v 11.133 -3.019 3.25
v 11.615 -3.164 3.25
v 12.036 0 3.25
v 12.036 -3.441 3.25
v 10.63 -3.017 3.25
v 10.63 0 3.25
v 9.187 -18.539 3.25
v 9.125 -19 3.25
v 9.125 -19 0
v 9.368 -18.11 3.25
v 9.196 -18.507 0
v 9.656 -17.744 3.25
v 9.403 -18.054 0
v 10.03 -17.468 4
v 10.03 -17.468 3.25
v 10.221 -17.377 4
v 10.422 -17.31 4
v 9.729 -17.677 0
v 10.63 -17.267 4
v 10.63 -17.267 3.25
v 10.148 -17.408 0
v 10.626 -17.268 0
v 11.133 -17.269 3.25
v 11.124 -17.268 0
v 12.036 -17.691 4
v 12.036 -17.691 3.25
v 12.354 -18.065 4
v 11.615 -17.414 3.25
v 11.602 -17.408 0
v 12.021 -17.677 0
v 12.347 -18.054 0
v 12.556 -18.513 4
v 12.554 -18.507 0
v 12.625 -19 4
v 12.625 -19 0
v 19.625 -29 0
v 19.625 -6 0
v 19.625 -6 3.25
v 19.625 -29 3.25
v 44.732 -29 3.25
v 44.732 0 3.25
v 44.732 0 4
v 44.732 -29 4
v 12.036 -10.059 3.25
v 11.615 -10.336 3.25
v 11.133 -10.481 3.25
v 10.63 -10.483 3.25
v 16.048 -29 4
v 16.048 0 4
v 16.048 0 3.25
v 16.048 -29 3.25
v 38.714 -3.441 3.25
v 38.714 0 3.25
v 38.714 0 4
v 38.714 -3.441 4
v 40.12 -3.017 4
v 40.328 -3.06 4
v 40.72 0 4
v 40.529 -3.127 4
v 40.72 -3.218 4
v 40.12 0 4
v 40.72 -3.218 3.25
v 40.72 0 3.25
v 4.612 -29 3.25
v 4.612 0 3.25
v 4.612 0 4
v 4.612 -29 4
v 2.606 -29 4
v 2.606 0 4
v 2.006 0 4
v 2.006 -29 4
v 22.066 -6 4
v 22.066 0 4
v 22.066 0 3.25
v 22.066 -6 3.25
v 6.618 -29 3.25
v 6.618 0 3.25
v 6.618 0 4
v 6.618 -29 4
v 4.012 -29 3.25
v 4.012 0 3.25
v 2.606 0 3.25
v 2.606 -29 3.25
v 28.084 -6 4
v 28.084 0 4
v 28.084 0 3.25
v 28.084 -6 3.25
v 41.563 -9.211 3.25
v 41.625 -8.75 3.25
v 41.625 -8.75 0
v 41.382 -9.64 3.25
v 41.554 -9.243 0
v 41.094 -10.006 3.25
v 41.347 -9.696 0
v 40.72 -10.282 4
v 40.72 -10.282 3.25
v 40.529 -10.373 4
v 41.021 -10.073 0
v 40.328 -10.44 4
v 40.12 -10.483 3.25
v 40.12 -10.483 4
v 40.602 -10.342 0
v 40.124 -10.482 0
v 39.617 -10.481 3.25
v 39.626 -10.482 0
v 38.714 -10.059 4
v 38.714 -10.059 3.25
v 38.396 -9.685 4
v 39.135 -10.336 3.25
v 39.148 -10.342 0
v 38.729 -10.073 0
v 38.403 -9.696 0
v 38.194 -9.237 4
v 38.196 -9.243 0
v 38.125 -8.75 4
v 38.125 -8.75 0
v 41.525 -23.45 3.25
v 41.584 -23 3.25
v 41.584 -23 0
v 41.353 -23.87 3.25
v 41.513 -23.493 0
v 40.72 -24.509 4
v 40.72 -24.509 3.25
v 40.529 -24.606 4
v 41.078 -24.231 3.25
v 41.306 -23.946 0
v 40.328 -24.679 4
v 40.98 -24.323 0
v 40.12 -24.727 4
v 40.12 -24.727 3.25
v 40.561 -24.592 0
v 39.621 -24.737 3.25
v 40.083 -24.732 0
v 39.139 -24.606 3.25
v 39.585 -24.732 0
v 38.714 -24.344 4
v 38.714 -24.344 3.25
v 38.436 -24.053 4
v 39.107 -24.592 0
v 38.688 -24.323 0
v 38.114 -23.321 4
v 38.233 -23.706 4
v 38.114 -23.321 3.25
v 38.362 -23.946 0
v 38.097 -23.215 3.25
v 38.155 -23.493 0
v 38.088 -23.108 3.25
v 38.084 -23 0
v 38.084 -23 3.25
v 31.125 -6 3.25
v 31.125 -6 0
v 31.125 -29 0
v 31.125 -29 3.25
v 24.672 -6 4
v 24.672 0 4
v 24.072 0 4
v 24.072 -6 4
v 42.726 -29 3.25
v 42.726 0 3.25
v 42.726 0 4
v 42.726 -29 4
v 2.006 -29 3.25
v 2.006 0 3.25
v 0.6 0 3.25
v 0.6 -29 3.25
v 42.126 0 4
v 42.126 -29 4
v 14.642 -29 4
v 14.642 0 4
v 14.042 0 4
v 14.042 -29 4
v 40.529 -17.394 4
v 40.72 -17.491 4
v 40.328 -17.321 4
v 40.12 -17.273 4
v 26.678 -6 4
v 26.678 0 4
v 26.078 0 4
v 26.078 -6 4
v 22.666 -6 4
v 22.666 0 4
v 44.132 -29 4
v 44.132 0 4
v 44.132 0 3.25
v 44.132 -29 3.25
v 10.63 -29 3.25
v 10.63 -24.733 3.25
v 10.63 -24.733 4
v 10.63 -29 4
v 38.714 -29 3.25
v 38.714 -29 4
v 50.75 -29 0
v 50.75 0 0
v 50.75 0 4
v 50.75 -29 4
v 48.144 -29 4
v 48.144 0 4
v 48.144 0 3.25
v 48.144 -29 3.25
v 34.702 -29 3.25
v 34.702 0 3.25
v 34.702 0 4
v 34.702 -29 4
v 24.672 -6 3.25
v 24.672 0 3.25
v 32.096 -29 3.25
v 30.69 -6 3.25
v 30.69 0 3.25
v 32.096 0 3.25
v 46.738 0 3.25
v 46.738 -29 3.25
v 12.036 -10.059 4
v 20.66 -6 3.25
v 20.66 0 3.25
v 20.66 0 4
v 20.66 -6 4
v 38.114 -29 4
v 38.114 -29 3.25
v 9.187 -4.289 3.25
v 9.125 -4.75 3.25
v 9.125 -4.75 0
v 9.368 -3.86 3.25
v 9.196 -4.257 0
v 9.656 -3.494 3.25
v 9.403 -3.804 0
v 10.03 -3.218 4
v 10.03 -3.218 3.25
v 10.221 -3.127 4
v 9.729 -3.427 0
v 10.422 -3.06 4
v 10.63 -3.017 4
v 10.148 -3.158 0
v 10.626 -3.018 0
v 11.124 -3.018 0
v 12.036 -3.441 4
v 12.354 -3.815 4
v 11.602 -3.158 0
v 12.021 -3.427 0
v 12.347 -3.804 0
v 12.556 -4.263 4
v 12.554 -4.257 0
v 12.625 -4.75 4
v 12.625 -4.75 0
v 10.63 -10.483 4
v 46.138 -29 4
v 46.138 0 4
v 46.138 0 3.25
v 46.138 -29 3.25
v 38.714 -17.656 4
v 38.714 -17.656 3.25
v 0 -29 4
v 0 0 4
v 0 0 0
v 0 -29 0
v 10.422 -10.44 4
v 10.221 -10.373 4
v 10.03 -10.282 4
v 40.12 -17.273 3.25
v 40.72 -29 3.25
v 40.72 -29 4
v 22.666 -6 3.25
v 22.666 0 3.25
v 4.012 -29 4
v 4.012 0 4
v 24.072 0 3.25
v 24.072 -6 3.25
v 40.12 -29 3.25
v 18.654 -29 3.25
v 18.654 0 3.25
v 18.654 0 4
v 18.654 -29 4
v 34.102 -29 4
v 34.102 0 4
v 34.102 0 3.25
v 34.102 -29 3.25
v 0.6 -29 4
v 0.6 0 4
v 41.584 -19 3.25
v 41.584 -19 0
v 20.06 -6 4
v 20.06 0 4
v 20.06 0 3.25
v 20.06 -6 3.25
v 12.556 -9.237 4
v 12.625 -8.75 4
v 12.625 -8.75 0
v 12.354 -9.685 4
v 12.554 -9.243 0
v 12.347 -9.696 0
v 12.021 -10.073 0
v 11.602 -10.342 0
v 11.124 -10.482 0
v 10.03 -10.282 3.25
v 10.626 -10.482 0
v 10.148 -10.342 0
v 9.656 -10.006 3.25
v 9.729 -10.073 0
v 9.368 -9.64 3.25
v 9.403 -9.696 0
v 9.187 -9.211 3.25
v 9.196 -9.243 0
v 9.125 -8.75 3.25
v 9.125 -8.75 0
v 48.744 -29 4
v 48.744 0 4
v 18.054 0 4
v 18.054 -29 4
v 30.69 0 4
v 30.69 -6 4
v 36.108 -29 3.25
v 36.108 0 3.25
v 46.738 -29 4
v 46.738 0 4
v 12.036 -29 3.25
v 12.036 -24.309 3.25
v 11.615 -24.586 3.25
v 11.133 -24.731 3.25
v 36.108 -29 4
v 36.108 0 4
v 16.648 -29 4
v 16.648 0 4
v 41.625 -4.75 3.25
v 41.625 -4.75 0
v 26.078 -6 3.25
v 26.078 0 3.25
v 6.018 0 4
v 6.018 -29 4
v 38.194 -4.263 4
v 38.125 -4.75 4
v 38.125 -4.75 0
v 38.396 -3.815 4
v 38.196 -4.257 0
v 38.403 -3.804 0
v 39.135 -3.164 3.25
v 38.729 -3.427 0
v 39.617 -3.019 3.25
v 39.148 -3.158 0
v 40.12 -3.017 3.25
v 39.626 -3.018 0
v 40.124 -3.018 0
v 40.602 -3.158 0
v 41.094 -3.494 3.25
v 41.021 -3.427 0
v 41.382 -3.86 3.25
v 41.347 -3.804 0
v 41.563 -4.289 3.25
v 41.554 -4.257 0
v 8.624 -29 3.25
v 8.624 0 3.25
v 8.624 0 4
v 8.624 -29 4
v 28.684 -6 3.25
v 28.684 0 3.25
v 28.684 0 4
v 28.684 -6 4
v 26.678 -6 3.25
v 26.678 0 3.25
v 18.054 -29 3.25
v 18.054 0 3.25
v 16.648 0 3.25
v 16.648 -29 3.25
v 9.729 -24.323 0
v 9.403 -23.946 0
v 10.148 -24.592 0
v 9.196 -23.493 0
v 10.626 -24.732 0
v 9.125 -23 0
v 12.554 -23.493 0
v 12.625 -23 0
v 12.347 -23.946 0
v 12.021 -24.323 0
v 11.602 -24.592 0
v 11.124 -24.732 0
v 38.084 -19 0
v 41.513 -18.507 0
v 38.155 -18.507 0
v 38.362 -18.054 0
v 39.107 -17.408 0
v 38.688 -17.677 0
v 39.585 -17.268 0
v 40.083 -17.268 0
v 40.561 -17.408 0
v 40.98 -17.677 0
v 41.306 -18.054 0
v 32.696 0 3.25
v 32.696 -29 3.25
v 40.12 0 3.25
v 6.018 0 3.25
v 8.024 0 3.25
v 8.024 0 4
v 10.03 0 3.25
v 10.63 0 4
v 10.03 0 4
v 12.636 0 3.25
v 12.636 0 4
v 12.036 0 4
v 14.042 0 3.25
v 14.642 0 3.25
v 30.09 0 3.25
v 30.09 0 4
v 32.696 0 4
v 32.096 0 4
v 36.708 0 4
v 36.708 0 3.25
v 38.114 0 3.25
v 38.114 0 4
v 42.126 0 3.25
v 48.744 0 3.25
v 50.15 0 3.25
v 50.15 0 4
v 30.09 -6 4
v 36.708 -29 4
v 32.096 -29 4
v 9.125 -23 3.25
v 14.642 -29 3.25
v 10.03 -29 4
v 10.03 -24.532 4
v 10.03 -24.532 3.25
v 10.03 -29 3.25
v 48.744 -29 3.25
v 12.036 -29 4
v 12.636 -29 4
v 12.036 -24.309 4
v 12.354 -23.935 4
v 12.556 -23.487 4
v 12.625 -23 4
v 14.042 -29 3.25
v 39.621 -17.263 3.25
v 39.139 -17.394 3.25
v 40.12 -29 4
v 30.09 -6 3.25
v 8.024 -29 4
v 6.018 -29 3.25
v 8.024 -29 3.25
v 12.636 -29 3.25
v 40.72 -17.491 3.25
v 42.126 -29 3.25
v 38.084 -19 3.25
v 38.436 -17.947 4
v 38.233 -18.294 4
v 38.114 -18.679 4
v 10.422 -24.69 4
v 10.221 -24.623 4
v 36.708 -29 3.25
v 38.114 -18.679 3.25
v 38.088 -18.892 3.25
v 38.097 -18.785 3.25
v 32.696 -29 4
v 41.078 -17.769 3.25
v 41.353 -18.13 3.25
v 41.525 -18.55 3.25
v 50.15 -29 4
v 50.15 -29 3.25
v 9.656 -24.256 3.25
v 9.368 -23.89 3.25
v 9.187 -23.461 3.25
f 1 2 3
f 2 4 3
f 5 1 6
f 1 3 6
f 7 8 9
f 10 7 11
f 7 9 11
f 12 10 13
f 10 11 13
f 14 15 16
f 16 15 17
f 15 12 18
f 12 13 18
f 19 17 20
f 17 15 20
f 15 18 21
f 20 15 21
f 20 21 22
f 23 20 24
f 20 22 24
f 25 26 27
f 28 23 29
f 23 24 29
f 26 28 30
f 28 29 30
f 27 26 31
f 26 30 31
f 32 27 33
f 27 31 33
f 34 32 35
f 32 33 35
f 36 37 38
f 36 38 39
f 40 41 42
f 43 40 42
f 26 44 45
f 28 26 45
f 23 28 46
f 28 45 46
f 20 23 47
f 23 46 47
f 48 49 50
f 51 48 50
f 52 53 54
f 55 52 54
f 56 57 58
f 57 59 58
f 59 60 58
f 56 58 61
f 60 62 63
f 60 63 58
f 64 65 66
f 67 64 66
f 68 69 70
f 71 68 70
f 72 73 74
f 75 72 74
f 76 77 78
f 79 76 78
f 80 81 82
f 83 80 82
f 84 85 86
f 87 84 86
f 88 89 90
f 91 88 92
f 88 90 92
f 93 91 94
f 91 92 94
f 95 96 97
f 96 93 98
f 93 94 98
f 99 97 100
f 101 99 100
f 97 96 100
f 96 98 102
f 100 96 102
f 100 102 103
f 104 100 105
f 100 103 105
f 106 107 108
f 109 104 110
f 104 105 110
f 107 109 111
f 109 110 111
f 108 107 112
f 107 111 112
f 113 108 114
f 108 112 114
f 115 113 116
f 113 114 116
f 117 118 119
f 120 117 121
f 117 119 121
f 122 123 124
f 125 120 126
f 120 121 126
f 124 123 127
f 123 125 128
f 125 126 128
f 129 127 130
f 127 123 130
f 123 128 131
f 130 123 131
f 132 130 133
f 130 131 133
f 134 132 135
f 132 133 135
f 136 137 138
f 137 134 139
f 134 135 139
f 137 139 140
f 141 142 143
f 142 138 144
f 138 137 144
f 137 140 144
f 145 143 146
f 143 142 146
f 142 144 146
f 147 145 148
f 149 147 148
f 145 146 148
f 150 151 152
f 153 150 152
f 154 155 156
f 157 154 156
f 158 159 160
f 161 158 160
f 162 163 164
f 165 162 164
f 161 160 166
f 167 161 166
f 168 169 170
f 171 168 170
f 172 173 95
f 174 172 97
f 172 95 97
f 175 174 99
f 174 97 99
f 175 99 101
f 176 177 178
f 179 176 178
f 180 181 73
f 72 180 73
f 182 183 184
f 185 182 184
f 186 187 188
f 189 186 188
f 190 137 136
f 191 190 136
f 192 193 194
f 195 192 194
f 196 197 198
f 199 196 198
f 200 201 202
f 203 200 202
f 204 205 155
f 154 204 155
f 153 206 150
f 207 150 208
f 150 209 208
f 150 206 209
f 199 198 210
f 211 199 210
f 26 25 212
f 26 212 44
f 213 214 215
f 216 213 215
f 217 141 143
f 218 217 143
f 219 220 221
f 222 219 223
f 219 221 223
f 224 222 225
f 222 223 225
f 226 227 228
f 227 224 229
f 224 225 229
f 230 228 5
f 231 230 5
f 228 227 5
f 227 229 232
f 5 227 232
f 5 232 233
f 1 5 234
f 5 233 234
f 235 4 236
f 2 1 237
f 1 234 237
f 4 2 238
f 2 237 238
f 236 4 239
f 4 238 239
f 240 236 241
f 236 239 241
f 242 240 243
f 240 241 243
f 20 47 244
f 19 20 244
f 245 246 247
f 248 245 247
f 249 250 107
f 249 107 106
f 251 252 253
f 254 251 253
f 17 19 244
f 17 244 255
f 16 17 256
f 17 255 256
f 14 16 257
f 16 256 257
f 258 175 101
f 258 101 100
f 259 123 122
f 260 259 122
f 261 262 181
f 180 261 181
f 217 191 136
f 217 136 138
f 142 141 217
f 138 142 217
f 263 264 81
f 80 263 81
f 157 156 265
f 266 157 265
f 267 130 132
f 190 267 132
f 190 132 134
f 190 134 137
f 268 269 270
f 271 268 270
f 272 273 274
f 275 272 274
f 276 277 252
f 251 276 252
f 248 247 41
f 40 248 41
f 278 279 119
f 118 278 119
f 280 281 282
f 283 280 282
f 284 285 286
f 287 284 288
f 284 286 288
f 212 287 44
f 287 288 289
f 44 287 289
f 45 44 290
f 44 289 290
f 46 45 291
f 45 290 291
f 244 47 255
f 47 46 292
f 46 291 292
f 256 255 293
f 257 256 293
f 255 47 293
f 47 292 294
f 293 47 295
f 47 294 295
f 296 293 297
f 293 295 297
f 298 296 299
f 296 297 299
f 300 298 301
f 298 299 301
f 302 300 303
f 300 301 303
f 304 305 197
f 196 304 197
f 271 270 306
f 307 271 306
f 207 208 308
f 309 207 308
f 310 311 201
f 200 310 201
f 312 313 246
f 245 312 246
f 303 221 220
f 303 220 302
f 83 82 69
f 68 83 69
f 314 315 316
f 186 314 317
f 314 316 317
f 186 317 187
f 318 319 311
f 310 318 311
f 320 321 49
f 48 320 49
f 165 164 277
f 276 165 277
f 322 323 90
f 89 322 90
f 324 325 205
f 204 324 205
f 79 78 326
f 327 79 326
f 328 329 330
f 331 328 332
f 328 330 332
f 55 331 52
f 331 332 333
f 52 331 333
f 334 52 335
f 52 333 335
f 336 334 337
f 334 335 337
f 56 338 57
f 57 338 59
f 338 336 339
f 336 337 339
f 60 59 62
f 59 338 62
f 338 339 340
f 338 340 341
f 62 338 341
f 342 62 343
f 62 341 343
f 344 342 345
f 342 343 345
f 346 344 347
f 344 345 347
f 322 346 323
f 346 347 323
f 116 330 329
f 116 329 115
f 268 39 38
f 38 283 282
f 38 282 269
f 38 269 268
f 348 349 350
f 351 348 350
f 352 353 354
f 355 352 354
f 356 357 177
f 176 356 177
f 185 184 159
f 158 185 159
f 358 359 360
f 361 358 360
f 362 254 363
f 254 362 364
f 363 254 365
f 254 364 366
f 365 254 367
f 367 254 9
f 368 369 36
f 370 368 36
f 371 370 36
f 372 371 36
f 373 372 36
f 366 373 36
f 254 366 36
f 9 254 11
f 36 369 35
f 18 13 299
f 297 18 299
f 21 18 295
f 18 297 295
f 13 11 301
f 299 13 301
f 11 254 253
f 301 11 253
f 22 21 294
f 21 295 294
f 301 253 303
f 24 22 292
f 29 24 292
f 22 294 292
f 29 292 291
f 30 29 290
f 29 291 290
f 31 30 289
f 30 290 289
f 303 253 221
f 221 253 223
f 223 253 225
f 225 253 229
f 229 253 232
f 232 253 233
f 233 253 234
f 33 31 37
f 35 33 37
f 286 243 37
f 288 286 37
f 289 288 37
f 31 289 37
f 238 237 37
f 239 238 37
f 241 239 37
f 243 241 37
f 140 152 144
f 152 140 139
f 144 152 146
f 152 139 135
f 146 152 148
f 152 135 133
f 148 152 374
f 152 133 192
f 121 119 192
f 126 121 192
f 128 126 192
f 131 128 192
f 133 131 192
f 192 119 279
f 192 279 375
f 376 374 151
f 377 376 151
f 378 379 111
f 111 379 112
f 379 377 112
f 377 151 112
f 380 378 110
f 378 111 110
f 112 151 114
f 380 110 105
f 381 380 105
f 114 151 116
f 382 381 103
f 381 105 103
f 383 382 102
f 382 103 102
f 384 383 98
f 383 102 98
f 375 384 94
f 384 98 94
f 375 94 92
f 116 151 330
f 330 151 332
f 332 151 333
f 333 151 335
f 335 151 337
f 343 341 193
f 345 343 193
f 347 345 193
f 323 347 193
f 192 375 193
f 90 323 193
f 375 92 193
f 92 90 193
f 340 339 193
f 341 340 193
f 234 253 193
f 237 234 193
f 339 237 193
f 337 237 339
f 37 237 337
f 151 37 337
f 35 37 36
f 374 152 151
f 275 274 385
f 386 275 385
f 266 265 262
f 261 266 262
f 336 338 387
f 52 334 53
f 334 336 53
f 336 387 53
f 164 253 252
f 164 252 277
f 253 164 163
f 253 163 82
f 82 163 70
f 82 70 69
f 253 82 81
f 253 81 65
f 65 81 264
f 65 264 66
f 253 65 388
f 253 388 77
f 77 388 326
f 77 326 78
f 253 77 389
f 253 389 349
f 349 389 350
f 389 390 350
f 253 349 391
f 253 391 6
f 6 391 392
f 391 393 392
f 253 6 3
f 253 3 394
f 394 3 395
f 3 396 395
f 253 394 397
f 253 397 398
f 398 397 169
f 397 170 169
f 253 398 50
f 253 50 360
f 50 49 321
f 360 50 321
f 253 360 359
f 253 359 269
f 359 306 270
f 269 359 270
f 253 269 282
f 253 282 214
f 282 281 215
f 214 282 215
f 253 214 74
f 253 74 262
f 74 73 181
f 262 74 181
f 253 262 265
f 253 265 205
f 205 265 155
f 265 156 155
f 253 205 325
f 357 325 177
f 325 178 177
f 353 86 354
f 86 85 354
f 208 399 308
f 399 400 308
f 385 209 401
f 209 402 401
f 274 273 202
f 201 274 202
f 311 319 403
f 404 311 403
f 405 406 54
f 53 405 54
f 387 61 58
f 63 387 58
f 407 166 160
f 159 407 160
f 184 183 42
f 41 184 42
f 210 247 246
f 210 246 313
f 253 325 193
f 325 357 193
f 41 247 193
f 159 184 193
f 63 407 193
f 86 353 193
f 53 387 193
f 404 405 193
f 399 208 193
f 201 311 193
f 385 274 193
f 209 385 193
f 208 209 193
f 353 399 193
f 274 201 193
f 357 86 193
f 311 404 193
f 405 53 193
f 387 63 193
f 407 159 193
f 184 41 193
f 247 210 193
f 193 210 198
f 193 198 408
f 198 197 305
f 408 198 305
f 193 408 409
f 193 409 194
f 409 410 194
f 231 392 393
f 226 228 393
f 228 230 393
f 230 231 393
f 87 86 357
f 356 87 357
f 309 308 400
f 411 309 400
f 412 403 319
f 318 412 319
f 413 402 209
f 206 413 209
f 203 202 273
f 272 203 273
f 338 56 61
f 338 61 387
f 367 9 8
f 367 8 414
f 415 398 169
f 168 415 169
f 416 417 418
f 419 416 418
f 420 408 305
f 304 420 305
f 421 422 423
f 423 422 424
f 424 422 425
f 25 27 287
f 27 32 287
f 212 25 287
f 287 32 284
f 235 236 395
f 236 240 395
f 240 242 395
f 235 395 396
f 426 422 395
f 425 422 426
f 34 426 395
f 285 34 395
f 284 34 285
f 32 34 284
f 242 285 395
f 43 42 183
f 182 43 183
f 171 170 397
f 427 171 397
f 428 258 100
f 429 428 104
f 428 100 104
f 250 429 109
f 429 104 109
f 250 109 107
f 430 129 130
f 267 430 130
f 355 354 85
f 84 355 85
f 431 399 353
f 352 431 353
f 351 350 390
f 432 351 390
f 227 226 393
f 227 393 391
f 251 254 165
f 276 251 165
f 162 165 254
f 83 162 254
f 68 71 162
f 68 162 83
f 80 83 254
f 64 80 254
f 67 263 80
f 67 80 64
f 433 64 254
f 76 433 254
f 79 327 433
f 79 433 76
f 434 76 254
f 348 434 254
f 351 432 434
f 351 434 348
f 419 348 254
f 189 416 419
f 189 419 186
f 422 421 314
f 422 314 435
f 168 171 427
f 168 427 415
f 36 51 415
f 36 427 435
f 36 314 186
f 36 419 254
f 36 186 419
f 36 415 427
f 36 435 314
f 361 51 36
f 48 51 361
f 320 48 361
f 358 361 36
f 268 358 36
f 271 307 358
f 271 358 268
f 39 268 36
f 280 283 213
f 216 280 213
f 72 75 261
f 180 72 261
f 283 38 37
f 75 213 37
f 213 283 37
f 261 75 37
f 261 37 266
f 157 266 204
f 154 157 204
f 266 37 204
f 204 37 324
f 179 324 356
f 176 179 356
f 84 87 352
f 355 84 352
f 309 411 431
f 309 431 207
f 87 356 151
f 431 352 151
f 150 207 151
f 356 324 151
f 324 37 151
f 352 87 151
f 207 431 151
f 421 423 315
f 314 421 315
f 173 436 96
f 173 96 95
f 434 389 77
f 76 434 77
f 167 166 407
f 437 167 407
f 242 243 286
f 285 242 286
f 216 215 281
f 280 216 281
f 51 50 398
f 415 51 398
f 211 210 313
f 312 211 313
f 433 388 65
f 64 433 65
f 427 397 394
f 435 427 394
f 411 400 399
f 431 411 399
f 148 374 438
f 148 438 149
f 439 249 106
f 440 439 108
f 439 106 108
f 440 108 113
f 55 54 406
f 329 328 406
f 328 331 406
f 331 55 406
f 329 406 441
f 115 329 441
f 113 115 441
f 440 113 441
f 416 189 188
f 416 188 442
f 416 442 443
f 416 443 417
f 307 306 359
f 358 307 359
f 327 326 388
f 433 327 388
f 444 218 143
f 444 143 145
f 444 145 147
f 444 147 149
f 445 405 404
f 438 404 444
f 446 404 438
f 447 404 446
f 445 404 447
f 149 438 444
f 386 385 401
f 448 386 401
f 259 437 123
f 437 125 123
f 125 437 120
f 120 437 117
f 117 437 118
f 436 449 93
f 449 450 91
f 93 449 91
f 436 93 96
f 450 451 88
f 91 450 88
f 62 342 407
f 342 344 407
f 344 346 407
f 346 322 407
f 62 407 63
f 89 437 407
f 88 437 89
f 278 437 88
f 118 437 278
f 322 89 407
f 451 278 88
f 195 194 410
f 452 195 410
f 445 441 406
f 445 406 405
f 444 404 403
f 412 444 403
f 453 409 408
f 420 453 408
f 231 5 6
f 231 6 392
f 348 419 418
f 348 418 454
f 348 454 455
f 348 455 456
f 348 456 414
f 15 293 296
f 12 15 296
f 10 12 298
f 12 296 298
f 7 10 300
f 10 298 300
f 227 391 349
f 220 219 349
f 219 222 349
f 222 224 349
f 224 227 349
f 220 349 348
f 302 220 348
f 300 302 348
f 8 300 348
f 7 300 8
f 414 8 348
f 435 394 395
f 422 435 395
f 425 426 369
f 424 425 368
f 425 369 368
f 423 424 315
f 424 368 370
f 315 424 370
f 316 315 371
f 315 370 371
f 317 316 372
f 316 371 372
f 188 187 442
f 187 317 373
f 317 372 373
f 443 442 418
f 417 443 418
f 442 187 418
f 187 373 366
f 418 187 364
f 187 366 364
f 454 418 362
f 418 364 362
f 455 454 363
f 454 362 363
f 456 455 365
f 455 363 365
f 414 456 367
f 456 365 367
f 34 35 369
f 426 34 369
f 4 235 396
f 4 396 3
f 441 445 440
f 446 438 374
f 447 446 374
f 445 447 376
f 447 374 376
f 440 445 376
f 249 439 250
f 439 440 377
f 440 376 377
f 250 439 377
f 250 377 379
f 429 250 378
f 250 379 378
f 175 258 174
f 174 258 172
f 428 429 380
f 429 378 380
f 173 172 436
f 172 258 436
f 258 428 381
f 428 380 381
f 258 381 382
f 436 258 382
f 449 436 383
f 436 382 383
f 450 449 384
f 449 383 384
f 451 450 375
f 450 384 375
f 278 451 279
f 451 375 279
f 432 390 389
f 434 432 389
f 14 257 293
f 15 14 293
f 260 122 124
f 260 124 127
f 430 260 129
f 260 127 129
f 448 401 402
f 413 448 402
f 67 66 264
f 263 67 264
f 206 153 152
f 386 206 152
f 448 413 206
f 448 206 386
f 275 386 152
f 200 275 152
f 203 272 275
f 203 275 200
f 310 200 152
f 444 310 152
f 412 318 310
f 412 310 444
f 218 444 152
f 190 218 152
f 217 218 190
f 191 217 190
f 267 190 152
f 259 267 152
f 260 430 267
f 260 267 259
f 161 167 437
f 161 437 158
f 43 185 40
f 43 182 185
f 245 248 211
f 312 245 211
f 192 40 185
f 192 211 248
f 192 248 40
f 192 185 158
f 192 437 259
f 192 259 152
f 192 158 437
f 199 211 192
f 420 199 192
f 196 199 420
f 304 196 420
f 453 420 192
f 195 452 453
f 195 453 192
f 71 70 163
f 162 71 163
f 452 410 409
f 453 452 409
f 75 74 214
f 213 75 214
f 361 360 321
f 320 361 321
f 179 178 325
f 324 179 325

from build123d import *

# Parameters (mm, degrees)
F1_DEPTH = 29
F2_W     = 5.75
F2_H     = 23
F3_DEPTH = 4
F2_W_2   = 3.5
F2_H_2   = 4
F4_DEPTH = 4.001


with BuildPart() as f1:
    # F0 (on Front) → F1 (new body)
    with BuildSketch(Plane.XZ):
        Polygon((0, 4), (0, 0), (50.75, 0), (50.75, 3.25), (50.75, 4), (50.15, 4), (50.15, 3.25), (48.744, 3.25), (48.744, 4), (48.144, 4), (48.144, 3.25), (46.738, 3.25), (46.738, 4), (46.138, 4), (46.138, 3.25), (44.732, 3.25), (44.732, 4), (44.132, 4), (44.132, 3.25), (42.726, 3.25), (42.726, 4), (42.126, 4), (42.126, 3.25), (40.72, 3.25), (40.72, 4), (40.12, 4), (40.12, 3.25), (38.714, 3.25), (38.714, 4), (38.114, 4), (38.114, 3.25), (36.708, 3.25), (36.708, 4), (36.108, 4), (36.108, 3.25), (34.702, 3.25), (34.702, 4), (34.102, 4), (34.102, 3.25), (32.696, 3.25), (32.696, 4), (32.096, 4), (32.096, 3.25), (30.69, 3.25), (30.69, 4), (30.09, 4), (30.09, 3.25), (28.684, 3.25), (28.684, 4), (28.084, 4), (28.084, 3.25), (26.678, 3.25), (26.678, 4), (26.078, 4), (26.078, 3.25), (24.672, 3.25), (24.672, 4), (24.072, 4), (24.072, 3.25), (22.666, 3.25), (22.666, 4), (22.066, 4), (22.066, 3.25), (20.66, 3.25), (20.66, 4), (20.06, 4), (20.06, 3.25), (18.654, 3.25), (18.654, 4), (18.054, 4), (18.054, 3.25), (16.648, 3.25), (16.648, 4), (16.048, 4), (16.048, 3.25), (14.642, 3.25), (14.642, 4), (14.042, 4), (14.042, 3.25), (12.636, 3.25), (12.636, 4), (12.036, 4), (12.036, 3.25), (10.63, 3.25), (10.63, 4), (10.03, 4), (10.03, 3.25), (8.624, 3.25), (8.624, 4), (8.324, 4), (8.024, 4), (8.024, 3.25), (6.618, 3.25), (6.618, 4), (6.318, 4), (6.018, 4), (6.018, 3.25), (4.612, 3.25), (4.612, 4), (4.012, 4), (4.012, 3.25), (2.606, 3.25), (2.606, 4), (2.006, 4), (2.006, 3.25), (0.6, 3.25), (0.6, 4), align=None)
    extrude(amount=F1_DEPTH)

    # F2 (on face) → F3 (cut, through all)
    with BuildSketch(Plane(origin=(0, 0, 0), x_dir=(1, 0, 0), z_dir=(0, 0, -1))):
        with Locations((22.5, 17.5)):
            Rectangle(F2_W, F2_H)
        with Locations((28.25, 17.5)):
            Rectangle(F2_W, F2_H)
    extrude(amount=-F3_DEPTH, mode=Mode.SUBTRACT)

    # F2 (on face) → F4 (cut, through all)
    with BuildSketch(Plane(origin=(0, 0, 0), x_dir=(1, 0, 0), z_dir=(0, 0, -1))):
        with BuildLine():
            ThreePointArc((12.625, 23), (10.875, 24.75), (9.125, 23))
            Line((9.125, 23), (12.625, 23))
        make_face()
        with Locations((10.875, 21)):
            Rectangle(F2_W_2, F2_H_2)
        with BuildLine():
            Line((12.625, 19), (9.125, 19))
            ThreePointArc((9.125, 19), (10.875, 17.25), (12.625, 19))
        make_face()
        with BuildLine():
            ThreePointArc((12.625, 8.75), (10.875, 10.5), (9.125, 8.75))
            Line((9.125, 8.75), (12.625, 8.75))
        make_face()
        with Locations((10.875, 6.75)):
            Rectangle(F2_W_2, F2_H_2)
        with BuildLine():
            Line((12.625, 4.75), (9.125, 4.75))
            ThreePointArc((9.125, 4.75), (10.875, 3), (12.625, 4.75))
        make_face()
        with BuildLine():
            ThreePointArc((41.5842387676, 23), (39.8342387676, 24.75), (38.0842387676, 23))
            Line((38.0842387676, 23), (41.5842387676, 23))
        make_face()
        with Locations((39.8342387676, 21)):
            Rectangle(F2_W_2, F2_H_2)
        with BuildLine():
            Line((41.5842387676, 19), (38.0842387676, 19))
            ThreePointArc((38.0842387676, 19), (39.8342387676, 17.25), (41.5842387676, 19))
        make_face()
        with BuildLine():
            ThreePointArc((41.625, 8.75), (39.875, 10.5), (38.125, 8.75))
            Line((38.125, 8.75), (41.625, 8.75))
        make_face()
        with Locations((39.875, 6.75)):
            Rectangle(F2_W_2, F2_H_2)
        with BuildLine():
            Line((41.625, 4.75), (38.125, 4.75))
            ThreePointArc((38.125, 4.75), (39.875, 3), (41.625, 4.75))
        make_face()
    extrude(amount=-F4_DEPTH, mode=Mode.SUBTRACT)


solid = f1.part
